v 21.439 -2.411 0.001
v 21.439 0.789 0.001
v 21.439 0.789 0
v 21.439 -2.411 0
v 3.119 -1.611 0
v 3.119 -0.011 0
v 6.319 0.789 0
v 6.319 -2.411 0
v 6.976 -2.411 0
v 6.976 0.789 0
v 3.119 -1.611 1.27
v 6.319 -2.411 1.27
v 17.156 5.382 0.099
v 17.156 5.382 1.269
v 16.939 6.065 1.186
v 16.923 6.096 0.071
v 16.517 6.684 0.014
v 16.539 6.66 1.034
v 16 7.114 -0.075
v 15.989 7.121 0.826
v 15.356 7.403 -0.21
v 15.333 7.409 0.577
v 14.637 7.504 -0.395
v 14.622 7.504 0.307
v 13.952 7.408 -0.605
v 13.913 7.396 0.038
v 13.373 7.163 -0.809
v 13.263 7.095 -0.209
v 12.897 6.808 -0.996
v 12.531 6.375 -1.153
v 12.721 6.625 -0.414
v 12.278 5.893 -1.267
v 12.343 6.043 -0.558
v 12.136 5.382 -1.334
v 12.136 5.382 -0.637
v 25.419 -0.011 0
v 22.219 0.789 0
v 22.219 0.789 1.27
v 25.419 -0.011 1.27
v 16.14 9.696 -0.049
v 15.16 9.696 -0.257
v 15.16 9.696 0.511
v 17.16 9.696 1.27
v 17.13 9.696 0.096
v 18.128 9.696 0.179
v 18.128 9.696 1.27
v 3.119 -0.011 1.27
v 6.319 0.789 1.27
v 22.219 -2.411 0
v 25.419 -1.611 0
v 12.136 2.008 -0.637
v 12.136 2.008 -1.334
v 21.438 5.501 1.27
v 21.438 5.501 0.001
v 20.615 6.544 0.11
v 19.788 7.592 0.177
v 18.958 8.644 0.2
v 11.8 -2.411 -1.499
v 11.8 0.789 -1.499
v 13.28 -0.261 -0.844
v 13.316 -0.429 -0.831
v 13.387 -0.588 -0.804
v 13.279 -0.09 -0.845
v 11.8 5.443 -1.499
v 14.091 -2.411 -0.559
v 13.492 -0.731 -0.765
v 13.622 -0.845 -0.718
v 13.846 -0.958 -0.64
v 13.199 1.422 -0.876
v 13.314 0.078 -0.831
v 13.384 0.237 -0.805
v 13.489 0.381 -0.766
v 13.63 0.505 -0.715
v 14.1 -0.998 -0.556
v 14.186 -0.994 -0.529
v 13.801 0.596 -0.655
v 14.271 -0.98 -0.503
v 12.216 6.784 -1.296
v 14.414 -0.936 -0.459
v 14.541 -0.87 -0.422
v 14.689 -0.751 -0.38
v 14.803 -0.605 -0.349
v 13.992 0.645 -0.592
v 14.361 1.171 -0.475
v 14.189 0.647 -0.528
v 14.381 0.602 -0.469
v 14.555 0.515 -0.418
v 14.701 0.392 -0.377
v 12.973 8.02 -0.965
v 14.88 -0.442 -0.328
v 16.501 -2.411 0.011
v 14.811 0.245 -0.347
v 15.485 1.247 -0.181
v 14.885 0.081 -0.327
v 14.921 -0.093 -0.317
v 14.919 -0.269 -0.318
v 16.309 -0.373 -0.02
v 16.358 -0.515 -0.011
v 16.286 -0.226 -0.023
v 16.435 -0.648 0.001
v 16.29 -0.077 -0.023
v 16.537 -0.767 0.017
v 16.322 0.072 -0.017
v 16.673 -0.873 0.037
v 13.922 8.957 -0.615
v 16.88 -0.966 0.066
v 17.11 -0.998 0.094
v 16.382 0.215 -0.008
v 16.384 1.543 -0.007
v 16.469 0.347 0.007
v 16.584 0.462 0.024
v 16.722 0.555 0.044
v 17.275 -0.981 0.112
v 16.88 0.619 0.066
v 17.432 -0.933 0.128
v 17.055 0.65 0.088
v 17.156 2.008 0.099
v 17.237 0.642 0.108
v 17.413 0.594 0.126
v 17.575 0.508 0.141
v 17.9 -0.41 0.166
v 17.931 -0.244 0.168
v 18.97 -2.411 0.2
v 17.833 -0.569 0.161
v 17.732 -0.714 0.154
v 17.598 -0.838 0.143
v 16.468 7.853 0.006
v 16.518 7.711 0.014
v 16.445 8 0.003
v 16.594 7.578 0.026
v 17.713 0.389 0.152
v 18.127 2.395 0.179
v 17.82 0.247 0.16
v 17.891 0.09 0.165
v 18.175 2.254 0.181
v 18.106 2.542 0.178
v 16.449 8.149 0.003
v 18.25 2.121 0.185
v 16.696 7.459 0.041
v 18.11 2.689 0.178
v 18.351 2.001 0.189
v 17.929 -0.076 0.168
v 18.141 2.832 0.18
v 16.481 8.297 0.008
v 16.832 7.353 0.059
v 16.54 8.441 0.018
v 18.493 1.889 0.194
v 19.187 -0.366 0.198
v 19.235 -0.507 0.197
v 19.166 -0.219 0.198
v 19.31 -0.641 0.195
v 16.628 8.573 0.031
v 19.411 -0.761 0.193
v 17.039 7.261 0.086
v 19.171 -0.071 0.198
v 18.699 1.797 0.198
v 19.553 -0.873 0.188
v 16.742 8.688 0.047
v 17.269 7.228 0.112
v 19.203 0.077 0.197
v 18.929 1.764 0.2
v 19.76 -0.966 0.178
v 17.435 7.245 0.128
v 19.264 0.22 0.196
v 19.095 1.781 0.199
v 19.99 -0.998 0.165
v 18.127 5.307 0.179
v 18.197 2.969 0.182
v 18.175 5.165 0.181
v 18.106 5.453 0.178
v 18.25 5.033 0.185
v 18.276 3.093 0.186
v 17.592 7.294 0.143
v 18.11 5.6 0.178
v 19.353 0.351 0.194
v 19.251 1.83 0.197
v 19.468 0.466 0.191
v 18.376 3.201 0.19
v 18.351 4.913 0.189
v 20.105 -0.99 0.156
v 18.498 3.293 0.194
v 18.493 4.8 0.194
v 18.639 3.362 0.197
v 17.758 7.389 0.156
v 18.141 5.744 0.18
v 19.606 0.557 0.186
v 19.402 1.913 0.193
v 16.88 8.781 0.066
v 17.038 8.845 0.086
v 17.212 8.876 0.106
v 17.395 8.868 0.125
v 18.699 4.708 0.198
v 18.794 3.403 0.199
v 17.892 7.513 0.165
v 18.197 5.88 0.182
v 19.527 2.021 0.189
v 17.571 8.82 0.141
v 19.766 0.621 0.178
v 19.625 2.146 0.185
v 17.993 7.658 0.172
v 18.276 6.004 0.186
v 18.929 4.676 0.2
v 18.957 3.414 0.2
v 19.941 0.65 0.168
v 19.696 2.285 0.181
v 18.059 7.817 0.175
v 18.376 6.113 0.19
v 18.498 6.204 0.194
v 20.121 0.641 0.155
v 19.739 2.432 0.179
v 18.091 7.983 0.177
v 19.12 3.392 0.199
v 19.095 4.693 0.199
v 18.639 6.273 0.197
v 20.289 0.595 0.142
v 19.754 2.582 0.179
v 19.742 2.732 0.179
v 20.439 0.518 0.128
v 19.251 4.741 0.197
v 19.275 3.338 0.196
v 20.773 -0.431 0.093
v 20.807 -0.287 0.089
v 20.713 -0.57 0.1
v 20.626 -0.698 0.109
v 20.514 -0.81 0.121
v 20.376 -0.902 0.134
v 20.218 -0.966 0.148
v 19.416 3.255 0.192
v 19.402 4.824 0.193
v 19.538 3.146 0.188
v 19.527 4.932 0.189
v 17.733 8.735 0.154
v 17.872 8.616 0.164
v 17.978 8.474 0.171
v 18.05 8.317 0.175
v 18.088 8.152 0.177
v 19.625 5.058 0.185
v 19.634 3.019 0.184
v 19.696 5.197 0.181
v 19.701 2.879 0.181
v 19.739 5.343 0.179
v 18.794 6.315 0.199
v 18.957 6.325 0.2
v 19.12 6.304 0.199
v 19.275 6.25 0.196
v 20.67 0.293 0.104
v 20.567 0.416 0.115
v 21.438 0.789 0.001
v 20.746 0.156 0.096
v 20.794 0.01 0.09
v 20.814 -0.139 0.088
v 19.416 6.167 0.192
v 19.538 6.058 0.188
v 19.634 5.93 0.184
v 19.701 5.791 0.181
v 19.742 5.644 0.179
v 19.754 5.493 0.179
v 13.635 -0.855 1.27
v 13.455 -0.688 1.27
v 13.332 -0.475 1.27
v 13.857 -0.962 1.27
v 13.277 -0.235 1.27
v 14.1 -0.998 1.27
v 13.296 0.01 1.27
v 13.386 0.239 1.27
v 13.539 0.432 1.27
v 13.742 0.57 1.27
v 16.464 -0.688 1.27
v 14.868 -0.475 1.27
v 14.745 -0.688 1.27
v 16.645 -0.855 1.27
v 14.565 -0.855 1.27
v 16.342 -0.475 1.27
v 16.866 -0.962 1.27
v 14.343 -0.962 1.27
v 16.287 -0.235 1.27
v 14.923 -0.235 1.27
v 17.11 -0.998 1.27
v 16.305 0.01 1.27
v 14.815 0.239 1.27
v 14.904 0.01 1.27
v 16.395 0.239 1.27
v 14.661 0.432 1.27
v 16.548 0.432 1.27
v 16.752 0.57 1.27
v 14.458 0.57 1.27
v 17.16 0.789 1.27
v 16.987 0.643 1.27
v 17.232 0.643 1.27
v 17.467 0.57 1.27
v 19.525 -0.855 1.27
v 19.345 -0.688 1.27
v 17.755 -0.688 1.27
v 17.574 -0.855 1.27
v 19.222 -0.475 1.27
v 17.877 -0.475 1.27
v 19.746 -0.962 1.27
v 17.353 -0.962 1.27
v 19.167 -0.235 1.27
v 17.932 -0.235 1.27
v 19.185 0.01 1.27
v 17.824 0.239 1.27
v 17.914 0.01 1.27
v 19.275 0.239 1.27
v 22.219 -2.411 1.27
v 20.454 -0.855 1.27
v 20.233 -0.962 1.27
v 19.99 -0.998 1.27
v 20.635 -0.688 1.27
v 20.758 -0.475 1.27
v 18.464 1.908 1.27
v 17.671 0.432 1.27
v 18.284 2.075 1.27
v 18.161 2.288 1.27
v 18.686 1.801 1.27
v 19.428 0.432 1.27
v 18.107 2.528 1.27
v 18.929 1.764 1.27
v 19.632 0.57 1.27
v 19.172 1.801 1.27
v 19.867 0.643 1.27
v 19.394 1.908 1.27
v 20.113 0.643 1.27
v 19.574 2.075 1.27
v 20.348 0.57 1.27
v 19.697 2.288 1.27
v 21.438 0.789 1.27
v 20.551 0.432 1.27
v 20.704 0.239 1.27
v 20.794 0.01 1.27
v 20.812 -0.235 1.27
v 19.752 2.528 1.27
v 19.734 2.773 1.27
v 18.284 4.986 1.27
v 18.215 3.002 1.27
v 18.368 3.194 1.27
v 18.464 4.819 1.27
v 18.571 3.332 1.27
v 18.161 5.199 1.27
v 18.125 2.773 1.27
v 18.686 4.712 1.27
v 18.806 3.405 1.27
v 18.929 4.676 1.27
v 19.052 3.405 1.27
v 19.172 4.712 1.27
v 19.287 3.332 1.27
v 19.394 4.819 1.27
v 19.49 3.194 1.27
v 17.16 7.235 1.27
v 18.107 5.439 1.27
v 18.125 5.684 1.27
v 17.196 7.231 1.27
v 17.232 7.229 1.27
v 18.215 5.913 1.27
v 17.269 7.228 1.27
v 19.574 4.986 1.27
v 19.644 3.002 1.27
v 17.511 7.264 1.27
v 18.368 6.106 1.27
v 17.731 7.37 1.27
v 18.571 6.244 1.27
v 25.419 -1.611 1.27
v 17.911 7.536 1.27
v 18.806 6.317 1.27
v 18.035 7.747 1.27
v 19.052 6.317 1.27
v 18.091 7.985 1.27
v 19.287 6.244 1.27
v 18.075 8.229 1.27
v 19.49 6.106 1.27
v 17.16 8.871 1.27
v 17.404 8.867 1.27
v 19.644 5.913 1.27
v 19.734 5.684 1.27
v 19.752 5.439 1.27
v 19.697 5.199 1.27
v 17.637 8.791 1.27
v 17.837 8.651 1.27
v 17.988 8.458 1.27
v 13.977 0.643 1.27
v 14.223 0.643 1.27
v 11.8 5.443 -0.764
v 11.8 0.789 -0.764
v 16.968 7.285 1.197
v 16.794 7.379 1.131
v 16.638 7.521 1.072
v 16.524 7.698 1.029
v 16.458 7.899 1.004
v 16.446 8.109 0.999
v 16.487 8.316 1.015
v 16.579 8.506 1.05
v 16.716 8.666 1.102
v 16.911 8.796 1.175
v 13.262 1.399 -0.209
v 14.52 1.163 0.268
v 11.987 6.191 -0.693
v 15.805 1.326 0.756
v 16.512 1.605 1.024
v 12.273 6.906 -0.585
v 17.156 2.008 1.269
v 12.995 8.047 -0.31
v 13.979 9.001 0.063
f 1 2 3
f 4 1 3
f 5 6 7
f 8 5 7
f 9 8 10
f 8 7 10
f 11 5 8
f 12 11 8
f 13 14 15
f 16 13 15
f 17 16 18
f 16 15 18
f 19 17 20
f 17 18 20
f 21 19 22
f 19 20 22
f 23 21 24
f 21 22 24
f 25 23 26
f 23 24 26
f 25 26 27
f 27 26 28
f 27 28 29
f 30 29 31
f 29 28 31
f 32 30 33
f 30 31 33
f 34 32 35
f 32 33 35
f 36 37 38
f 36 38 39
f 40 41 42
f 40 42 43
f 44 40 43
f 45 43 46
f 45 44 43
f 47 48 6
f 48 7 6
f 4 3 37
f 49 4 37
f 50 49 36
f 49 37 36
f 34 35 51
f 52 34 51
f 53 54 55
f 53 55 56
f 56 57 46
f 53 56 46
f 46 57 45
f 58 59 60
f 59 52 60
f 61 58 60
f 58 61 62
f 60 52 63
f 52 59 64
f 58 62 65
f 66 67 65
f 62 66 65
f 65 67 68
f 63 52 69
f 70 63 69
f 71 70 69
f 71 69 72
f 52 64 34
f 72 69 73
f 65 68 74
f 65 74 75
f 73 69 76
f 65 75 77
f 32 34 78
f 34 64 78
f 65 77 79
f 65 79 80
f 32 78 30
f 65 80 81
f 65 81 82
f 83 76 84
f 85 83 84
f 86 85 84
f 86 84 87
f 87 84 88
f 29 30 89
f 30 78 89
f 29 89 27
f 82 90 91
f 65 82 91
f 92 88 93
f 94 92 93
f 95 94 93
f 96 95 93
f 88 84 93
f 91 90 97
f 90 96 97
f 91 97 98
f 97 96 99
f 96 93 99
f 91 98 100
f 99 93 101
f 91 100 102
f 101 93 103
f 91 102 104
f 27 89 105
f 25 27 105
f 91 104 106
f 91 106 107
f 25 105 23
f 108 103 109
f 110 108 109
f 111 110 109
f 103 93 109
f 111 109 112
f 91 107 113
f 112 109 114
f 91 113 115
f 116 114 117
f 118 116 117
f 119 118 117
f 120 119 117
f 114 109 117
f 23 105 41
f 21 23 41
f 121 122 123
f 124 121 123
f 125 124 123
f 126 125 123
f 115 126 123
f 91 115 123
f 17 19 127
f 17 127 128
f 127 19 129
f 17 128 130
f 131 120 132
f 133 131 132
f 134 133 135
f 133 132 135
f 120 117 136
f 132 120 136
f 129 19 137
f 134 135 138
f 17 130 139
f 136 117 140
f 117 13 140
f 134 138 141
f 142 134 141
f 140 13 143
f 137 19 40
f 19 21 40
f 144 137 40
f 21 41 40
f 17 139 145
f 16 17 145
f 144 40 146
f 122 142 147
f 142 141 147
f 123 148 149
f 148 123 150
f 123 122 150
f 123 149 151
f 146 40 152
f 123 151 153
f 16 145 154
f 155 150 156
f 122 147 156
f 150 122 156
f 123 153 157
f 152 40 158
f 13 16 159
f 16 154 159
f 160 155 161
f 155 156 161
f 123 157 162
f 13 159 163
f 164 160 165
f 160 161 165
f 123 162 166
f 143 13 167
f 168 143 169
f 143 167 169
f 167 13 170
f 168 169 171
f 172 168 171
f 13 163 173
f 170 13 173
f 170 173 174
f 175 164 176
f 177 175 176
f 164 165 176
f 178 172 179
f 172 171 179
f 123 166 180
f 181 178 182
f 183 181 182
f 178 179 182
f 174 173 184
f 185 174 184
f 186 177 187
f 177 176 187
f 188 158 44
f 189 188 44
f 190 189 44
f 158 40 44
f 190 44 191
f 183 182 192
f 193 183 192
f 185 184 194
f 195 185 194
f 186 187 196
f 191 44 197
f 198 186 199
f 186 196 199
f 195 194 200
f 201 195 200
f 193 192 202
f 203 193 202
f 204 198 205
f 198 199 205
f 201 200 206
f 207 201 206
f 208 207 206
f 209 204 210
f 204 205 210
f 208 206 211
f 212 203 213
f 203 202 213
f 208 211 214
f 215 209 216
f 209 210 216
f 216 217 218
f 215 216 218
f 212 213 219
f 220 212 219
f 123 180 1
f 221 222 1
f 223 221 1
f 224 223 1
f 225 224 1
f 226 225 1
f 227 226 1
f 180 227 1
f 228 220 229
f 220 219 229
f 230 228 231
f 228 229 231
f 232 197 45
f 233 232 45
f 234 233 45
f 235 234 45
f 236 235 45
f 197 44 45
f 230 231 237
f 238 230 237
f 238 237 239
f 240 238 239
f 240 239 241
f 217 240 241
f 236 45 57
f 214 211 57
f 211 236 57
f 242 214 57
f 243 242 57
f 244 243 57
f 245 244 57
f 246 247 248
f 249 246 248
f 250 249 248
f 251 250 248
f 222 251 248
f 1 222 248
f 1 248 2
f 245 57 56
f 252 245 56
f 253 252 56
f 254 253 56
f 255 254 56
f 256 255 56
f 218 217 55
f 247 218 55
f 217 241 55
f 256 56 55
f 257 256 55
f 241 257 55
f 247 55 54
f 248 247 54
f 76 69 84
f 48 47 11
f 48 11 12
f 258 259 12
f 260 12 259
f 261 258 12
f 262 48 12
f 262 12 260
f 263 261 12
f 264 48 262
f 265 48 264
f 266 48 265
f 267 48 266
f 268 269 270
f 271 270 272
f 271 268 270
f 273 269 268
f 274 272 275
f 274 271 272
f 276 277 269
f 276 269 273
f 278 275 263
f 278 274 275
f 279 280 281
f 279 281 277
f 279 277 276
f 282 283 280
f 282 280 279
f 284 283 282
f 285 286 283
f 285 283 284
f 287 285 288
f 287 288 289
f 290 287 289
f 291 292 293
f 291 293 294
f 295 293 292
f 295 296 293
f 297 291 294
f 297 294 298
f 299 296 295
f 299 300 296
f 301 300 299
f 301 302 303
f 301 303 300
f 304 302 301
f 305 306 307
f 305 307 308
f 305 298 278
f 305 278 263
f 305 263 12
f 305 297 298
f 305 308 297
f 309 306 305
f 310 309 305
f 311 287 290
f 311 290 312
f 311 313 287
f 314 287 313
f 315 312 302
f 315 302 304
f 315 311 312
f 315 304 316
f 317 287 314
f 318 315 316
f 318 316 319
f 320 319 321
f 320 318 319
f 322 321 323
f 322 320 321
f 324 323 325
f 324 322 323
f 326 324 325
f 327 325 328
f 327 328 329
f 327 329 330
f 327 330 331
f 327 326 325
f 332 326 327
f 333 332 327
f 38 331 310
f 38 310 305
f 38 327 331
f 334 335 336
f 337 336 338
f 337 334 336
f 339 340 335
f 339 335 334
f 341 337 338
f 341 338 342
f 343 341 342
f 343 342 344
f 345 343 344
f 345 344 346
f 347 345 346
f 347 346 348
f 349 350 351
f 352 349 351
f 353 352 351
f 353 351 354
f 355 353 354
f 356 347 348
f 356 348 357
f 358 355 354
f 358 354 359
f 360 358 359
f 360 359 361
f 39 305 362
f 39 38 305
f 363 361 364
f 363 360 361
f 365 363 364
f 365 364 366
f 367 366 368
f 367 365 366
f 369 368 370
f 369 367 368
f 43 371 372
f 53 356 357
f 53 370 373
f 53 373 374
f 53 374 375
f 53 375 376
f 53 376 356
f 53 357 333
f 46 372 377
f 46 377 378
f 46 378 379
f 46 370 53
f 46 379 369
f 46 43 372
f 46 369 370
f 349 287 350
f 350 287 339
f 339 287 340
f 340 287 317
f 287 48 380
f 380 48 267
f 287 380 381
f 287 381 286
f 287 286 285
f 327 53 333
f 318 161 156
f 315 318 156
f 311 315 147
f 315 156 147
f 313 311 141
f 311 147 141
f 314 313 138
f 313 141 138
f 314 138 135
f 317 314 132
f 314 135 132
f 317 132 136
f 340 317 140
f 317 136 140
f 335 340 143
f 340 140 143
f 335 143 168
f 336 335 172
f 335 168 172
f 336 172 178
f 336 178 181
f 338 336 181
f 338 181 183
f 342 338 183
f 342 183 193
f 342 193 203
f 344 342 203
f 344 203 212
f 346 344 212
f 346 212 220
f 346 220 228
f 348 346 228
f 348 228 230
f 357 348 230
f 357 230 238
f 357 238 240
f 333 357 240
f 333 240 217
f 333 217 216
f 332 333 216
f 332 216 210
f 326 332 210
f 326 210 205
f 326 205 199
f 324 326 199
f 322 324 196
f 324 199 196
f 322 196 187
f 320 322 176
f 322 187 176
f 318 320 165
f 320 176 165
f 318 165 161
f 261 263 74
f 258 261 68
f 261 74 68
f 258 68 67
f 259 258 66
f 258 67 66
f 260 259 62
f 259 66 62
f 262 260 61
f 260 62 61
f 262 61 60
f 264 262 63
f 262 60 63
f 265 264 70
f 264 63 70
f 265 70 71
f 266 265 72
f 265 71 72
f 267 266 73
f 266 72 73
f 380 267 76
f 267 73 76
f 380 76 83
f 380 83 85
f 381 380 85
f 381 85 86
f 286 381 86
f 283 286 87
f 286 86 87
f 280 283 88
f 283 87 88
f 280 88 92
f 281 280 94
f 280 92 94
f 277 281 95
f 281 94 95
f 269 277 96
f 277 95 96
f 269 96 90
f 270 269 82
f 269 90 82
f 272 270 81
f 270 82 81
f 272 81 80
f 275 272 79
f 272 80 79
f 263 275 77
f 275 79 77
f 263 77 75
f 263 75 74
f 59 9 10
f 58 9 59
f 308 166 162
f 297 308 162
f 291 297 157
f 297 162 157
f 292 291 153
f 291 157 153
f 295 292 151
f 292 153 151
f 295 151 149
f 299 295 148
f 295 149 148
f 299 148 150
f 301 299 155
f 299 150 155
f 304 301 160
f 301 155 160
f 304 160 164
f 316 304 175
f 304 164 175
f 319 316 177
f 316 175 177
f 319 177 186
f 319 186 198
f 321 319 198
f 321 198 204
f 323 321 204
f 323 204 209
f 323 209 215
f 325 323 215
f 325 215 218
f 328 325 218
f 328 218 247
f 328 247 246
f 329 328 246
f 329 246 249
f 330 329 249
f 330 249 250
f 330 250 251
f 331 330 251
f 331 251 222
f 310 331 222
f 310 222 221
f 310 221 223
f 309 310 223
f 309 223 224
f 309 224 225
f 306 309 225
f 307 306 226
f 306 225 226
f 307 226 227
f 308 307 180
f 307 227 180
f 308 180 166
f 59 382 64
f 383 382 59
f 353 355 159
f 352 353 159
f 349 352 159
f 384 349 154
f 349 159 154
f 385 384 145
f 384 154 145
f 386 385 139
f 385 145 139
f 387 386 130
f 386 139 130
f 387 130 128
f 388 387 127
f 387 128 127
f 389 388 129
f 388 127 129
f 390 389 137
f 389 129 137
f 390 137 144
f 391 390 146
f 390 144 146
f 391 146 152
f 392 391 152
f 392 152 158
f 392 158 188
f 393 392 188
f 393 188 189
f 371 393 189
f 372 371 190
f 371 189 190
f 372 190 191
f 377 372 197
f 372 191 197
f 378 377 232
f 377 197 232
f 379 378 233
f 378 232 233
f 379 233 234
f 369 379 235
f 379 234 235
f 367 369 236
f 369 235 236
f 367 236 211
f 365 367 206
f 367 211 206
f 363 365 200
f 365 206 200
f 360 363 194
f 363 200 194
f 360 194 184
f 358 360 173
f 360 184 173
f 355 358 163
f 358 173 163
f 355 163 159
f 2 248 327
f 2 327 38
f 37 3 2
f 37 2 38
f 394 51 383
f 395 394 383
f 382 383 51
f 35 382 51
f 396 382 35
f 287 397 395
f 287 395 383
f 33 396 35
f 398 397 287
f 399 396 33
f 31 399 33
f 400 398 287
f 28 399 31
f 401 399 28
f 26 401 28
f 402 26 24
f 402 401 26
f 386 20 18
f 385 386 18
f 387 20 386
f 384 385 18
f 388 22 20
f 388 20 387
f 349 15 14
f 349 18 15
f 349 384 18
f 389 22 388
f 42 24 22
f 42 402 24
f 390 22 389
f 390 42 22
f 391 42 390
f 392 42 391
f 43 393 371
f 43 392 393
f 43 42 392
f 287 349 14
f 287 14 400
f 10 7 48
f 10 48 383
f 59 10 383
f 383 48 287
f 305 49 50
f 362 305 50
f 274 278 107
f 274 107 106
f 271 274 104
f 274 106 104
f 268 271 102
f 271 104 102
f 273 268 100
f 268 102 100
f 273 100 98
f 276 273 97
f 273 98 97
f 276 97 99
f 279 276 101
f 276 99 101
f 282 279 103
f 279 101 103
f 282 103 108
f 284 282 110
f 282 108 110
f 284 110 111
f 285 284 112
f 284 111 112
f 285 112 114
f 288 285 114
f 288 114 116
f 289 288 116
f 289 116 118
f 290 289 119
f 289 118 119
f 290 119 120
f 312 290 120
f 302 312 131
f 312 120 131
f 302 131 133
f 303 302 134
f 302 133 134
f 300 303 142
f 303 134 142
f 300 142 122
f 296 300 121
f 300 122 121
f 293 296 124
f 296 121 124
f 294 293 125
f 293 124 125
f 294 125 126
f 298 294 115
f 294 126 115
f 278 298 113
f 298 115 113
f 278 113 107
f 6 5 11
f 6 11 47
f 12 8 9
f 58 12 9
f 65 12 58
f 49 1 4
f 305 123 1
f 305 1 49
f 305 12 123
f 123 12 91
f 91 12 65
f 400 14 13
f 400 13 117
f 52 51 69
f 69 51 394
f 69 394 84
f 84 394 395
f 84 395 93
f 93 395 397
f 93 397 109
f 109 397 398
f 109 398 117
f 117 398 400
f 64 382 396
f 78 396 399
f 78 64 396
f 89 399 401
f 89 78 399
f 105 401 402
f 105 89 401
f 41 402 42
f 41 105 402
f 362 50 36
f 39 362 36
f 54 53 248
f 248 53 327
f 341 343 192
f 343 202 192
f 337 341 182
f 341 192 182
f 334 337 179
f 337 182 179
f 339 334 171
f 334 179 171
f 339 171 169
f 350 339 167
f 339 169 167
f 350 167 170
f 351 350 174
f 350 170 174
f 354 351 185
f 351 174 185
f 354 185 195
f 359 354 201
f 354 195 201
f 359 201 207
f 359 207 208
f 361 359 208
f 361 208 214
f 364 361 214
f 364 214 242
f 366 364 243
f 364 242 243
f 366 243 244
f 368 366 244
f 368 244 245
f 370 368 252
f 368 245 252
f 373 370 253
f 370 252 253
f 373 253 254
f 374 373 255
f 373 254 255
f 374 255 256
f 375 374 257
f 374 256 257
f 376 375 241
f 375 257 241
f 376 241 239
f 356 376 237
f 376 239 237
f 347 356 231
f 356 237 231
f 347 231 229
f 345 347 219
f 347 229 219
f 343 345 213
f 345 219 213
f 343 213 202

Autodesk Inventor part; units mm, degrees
ref_plane "YZ Plane" through (0, 0, 0) normal (1, 0, 0) x (0, 1, 0)
ref_plane "XZ Plane" through (0, 0, 0) normal (0, 1, 0) x (-1, 0, 0)
ref_plane "XY Plane" through (0, 0, 0) normal (0, 0, 1) x (1, 0, 0)
sketch "HeadplateSketch" plane through (0, 0, 0) normal (0, 0, 1) x (1, 0, 0)
  line L0 (22.2193, -2.4109) -> (25.4193, -1.6109)
  line L1 (25.4193, -1.6109) -> (25.4193, -0.0109)
  line L2 (6.3193, 0.7891) -> (3.1193, -0.0109)
  line L3 (3.1193, -1.6109) -> (3.1193, -0.0109)
  line L4 (6.3193, 0.7891) -> (22.2193, 0.7891)
  line L5 (22.2193, 0.7891) -> (25.4193, -0.0109)
  line L6 (17.1922, 9.6958) -> (17.1922, -2.4109)
  line L7 (17.1922, 9.6958) -> (18.128, 9.6958)
  line L8 (17.1922, 9.6958) -> (15.1602, 9.6958)
  line L9 (11.7996, 5.443) -> (11.7996, -2.4109)
  line L10 (21.4383, 5.5008) -> (21.4383, -2.4109)
  line L11 (21.4383, 5.5008) -> (18.128, 9.6958)
  arc A0 (15.1602, 9.6958) -> (11.7996, 5.443) centre (17.4689, 4.4173) ccw
  line L12 (3.1193, -1.6109) -> (6.3193, -2.4109)
  line L13 (6.3193, -2.4109) -> (22.2193, -2.4109)
  point P0 (11.7996, 0.7891)
  dimension "d95" = 3.2
  dimension "d102" = 1.6
  dimension "d104" = 3.2
  dimension "d106" = 0.8
  dimension "d109" = 1.6
  dimension "d110" = 3.2
  dimension "d112" = 22.3
  dimension "d113" = 15.9
extrude "拉伸1" add sketch "HeadplateSketch" along normal blind 1.27
extrude "拉伸8" add sketch "HeadplateSketch" against normal blind 1.5 contours L13 L6 L4 L10 | L4 L6 L7 L11 L10 | L13 L9 L4 L6 | L4 L9 A0 L8 L6
sketch "草图2" plane through (15.1602, 9.6958, 1.27) normal (0, 1, 0) x (1, 0, 0)
  line L0 (-3.3633, 2.0352) -> (1.9994, 0)
  arc A0 (-3.3633, 2.77) -> (6.2787, 1.2693) centre (3.7754, 16.9113) ccw
  line L1 (1.9994, 0) -> (6.2787, 0)
  line L2 (-3.3633, 2.77) -> (6.2787, 2.77)
  line L3 (2.9678, 2.77) -> (0, 2.77) projected
  line L4 (6.2787, 1.2693) -> (6.2787, 2.77)
  line L5 (-3.3633, 0) -> (1.9994, 0)
  line L6 (0, 0) -> (2.9678, 0) projected
  line L7 (2.9678, 0) -> (2.9678, 2.77) projected
  line L8 (-3.3633, 0) -> (-3.3633, 2.0352)
extrude "拉伸4" cut sketch "草图2" against normal up to next contours A0 L2 L7 | L7 L2 L4 A0
sketch "草图6" plane through (6.3193, -2.4109, 0) normal (0, -1, 0) x (1, 0, 0)
  line L0 (0, 0) -> (5.4803, 0)
  line L1 (0.6566, 0) -> (5.4803, -1.4987)
  line L2 (5.4803, 0) -> (5.4803, -1.4987)
  line L3 (0.6566, 0) -> (5.4803, 0)
  arc A0 (15.1197, 0.0007) -> (5.4803, -1.4987) centre (12.6164, -15.6413) ccw projected
  line L4 (5.4803, 0) -> (5.4803, -1.4987) projected
  dimension "d119" = 0
  dimension "d120" = 0
extrude "拉伸7" add sketch "草图6" against normal up to surface (3.2 mm away)
sketch "草图3" plane through (6.3193, 0.7891, 0) normal (0, 1, 0) x (1, 0, 0)
  line L0 (0, -1.27) -> (5.4803, -1.27) projected
  line L1 (5.4803, 0) -> (5.4803, -1.27) projected
  line L2 (5.4803, 0) -> (0, 0) projected
  line L3 (0, 0) -> (0, -1.27) projected
  line L4 (5.4803, -1.27) -> (16.1538, -1.27)
  line L5 (16.1538, -1.27) -> (17.1139, -1.27)
  line L6 (17.1139, -1.27) -> (17.1139, 0.0011)
extrude "拉伸9" cut sketch "草图2" against normal up to surface (8.9067 mm away) contours L0 L5 L8
sketch "草图4" plane through (0, 0, 1.27) normal (0, 0, 1) x (1, 0, 0)
  circle A0 centre (17.2686, 8.053) radius 0.825
  circle A1 centre (18.9292, 5.5008) radius 0.825
  circle A2 centre (18.9292, 2.5892) radius 0.825
  circle A3 centre (17.1095, -0.1732) radius 0.825
  line L0 (6.3193, 0.7891) -> (11.7996, 0.7891) projected
  line L1 (12.1356, 5.3815) -> (12.1356, 2.0023)
  line L2 (12.1356, 5.3815) -> (17.1561, 5.3815)
  line L3 (17.1561, 5.3815) -> (17.1561, 2.008)
  line L4 (17.1561, 2.008) -> (12.1356, 2.008)
  line L5 (11.7983, 4.0675) -> (12.1356, 4.0675)
  arc A4 (17.1561, 5.3815) -> (12.1356, 5.3815) centre (14.6459, 4.9584) ccw
  arc A5 (12.1356, 2.008) -> (17.1561, 2.008) centre (14.6459, 5.3033) ccw
  circle A6 centre (19.9896, -0.1732) radius 0.825
  circle A7 centre (14.1001, -0.1732) radius 0.825
  point P0 (21.4383, 5.5008)
  dimension "d121" = 0.9623
extrude "拉伸10" cut sketch "草图4" against normal through all contours L2 L3 L4 L1 | A4 L2 | L4 A5
hole "打孔7" at (18.9292, 5.5008, 1.27) at (18.9292, 2.5892, 1.27) at (17.1095, -0.1732, 1.27) at (17.2686, 8.053, 1.27) direction (0, 0, -1) diameter 1.65 end through all
hole "打孔8" at (14.1001, -0.1732, 1.27) at (19.9896, -0.1732, 1.27) direction (0, 0, -1) diameter 1.65 end through all
properties part number "JF-JM-HC0011" material "TITANIUM, 6AL-4V, ANNEALED"
